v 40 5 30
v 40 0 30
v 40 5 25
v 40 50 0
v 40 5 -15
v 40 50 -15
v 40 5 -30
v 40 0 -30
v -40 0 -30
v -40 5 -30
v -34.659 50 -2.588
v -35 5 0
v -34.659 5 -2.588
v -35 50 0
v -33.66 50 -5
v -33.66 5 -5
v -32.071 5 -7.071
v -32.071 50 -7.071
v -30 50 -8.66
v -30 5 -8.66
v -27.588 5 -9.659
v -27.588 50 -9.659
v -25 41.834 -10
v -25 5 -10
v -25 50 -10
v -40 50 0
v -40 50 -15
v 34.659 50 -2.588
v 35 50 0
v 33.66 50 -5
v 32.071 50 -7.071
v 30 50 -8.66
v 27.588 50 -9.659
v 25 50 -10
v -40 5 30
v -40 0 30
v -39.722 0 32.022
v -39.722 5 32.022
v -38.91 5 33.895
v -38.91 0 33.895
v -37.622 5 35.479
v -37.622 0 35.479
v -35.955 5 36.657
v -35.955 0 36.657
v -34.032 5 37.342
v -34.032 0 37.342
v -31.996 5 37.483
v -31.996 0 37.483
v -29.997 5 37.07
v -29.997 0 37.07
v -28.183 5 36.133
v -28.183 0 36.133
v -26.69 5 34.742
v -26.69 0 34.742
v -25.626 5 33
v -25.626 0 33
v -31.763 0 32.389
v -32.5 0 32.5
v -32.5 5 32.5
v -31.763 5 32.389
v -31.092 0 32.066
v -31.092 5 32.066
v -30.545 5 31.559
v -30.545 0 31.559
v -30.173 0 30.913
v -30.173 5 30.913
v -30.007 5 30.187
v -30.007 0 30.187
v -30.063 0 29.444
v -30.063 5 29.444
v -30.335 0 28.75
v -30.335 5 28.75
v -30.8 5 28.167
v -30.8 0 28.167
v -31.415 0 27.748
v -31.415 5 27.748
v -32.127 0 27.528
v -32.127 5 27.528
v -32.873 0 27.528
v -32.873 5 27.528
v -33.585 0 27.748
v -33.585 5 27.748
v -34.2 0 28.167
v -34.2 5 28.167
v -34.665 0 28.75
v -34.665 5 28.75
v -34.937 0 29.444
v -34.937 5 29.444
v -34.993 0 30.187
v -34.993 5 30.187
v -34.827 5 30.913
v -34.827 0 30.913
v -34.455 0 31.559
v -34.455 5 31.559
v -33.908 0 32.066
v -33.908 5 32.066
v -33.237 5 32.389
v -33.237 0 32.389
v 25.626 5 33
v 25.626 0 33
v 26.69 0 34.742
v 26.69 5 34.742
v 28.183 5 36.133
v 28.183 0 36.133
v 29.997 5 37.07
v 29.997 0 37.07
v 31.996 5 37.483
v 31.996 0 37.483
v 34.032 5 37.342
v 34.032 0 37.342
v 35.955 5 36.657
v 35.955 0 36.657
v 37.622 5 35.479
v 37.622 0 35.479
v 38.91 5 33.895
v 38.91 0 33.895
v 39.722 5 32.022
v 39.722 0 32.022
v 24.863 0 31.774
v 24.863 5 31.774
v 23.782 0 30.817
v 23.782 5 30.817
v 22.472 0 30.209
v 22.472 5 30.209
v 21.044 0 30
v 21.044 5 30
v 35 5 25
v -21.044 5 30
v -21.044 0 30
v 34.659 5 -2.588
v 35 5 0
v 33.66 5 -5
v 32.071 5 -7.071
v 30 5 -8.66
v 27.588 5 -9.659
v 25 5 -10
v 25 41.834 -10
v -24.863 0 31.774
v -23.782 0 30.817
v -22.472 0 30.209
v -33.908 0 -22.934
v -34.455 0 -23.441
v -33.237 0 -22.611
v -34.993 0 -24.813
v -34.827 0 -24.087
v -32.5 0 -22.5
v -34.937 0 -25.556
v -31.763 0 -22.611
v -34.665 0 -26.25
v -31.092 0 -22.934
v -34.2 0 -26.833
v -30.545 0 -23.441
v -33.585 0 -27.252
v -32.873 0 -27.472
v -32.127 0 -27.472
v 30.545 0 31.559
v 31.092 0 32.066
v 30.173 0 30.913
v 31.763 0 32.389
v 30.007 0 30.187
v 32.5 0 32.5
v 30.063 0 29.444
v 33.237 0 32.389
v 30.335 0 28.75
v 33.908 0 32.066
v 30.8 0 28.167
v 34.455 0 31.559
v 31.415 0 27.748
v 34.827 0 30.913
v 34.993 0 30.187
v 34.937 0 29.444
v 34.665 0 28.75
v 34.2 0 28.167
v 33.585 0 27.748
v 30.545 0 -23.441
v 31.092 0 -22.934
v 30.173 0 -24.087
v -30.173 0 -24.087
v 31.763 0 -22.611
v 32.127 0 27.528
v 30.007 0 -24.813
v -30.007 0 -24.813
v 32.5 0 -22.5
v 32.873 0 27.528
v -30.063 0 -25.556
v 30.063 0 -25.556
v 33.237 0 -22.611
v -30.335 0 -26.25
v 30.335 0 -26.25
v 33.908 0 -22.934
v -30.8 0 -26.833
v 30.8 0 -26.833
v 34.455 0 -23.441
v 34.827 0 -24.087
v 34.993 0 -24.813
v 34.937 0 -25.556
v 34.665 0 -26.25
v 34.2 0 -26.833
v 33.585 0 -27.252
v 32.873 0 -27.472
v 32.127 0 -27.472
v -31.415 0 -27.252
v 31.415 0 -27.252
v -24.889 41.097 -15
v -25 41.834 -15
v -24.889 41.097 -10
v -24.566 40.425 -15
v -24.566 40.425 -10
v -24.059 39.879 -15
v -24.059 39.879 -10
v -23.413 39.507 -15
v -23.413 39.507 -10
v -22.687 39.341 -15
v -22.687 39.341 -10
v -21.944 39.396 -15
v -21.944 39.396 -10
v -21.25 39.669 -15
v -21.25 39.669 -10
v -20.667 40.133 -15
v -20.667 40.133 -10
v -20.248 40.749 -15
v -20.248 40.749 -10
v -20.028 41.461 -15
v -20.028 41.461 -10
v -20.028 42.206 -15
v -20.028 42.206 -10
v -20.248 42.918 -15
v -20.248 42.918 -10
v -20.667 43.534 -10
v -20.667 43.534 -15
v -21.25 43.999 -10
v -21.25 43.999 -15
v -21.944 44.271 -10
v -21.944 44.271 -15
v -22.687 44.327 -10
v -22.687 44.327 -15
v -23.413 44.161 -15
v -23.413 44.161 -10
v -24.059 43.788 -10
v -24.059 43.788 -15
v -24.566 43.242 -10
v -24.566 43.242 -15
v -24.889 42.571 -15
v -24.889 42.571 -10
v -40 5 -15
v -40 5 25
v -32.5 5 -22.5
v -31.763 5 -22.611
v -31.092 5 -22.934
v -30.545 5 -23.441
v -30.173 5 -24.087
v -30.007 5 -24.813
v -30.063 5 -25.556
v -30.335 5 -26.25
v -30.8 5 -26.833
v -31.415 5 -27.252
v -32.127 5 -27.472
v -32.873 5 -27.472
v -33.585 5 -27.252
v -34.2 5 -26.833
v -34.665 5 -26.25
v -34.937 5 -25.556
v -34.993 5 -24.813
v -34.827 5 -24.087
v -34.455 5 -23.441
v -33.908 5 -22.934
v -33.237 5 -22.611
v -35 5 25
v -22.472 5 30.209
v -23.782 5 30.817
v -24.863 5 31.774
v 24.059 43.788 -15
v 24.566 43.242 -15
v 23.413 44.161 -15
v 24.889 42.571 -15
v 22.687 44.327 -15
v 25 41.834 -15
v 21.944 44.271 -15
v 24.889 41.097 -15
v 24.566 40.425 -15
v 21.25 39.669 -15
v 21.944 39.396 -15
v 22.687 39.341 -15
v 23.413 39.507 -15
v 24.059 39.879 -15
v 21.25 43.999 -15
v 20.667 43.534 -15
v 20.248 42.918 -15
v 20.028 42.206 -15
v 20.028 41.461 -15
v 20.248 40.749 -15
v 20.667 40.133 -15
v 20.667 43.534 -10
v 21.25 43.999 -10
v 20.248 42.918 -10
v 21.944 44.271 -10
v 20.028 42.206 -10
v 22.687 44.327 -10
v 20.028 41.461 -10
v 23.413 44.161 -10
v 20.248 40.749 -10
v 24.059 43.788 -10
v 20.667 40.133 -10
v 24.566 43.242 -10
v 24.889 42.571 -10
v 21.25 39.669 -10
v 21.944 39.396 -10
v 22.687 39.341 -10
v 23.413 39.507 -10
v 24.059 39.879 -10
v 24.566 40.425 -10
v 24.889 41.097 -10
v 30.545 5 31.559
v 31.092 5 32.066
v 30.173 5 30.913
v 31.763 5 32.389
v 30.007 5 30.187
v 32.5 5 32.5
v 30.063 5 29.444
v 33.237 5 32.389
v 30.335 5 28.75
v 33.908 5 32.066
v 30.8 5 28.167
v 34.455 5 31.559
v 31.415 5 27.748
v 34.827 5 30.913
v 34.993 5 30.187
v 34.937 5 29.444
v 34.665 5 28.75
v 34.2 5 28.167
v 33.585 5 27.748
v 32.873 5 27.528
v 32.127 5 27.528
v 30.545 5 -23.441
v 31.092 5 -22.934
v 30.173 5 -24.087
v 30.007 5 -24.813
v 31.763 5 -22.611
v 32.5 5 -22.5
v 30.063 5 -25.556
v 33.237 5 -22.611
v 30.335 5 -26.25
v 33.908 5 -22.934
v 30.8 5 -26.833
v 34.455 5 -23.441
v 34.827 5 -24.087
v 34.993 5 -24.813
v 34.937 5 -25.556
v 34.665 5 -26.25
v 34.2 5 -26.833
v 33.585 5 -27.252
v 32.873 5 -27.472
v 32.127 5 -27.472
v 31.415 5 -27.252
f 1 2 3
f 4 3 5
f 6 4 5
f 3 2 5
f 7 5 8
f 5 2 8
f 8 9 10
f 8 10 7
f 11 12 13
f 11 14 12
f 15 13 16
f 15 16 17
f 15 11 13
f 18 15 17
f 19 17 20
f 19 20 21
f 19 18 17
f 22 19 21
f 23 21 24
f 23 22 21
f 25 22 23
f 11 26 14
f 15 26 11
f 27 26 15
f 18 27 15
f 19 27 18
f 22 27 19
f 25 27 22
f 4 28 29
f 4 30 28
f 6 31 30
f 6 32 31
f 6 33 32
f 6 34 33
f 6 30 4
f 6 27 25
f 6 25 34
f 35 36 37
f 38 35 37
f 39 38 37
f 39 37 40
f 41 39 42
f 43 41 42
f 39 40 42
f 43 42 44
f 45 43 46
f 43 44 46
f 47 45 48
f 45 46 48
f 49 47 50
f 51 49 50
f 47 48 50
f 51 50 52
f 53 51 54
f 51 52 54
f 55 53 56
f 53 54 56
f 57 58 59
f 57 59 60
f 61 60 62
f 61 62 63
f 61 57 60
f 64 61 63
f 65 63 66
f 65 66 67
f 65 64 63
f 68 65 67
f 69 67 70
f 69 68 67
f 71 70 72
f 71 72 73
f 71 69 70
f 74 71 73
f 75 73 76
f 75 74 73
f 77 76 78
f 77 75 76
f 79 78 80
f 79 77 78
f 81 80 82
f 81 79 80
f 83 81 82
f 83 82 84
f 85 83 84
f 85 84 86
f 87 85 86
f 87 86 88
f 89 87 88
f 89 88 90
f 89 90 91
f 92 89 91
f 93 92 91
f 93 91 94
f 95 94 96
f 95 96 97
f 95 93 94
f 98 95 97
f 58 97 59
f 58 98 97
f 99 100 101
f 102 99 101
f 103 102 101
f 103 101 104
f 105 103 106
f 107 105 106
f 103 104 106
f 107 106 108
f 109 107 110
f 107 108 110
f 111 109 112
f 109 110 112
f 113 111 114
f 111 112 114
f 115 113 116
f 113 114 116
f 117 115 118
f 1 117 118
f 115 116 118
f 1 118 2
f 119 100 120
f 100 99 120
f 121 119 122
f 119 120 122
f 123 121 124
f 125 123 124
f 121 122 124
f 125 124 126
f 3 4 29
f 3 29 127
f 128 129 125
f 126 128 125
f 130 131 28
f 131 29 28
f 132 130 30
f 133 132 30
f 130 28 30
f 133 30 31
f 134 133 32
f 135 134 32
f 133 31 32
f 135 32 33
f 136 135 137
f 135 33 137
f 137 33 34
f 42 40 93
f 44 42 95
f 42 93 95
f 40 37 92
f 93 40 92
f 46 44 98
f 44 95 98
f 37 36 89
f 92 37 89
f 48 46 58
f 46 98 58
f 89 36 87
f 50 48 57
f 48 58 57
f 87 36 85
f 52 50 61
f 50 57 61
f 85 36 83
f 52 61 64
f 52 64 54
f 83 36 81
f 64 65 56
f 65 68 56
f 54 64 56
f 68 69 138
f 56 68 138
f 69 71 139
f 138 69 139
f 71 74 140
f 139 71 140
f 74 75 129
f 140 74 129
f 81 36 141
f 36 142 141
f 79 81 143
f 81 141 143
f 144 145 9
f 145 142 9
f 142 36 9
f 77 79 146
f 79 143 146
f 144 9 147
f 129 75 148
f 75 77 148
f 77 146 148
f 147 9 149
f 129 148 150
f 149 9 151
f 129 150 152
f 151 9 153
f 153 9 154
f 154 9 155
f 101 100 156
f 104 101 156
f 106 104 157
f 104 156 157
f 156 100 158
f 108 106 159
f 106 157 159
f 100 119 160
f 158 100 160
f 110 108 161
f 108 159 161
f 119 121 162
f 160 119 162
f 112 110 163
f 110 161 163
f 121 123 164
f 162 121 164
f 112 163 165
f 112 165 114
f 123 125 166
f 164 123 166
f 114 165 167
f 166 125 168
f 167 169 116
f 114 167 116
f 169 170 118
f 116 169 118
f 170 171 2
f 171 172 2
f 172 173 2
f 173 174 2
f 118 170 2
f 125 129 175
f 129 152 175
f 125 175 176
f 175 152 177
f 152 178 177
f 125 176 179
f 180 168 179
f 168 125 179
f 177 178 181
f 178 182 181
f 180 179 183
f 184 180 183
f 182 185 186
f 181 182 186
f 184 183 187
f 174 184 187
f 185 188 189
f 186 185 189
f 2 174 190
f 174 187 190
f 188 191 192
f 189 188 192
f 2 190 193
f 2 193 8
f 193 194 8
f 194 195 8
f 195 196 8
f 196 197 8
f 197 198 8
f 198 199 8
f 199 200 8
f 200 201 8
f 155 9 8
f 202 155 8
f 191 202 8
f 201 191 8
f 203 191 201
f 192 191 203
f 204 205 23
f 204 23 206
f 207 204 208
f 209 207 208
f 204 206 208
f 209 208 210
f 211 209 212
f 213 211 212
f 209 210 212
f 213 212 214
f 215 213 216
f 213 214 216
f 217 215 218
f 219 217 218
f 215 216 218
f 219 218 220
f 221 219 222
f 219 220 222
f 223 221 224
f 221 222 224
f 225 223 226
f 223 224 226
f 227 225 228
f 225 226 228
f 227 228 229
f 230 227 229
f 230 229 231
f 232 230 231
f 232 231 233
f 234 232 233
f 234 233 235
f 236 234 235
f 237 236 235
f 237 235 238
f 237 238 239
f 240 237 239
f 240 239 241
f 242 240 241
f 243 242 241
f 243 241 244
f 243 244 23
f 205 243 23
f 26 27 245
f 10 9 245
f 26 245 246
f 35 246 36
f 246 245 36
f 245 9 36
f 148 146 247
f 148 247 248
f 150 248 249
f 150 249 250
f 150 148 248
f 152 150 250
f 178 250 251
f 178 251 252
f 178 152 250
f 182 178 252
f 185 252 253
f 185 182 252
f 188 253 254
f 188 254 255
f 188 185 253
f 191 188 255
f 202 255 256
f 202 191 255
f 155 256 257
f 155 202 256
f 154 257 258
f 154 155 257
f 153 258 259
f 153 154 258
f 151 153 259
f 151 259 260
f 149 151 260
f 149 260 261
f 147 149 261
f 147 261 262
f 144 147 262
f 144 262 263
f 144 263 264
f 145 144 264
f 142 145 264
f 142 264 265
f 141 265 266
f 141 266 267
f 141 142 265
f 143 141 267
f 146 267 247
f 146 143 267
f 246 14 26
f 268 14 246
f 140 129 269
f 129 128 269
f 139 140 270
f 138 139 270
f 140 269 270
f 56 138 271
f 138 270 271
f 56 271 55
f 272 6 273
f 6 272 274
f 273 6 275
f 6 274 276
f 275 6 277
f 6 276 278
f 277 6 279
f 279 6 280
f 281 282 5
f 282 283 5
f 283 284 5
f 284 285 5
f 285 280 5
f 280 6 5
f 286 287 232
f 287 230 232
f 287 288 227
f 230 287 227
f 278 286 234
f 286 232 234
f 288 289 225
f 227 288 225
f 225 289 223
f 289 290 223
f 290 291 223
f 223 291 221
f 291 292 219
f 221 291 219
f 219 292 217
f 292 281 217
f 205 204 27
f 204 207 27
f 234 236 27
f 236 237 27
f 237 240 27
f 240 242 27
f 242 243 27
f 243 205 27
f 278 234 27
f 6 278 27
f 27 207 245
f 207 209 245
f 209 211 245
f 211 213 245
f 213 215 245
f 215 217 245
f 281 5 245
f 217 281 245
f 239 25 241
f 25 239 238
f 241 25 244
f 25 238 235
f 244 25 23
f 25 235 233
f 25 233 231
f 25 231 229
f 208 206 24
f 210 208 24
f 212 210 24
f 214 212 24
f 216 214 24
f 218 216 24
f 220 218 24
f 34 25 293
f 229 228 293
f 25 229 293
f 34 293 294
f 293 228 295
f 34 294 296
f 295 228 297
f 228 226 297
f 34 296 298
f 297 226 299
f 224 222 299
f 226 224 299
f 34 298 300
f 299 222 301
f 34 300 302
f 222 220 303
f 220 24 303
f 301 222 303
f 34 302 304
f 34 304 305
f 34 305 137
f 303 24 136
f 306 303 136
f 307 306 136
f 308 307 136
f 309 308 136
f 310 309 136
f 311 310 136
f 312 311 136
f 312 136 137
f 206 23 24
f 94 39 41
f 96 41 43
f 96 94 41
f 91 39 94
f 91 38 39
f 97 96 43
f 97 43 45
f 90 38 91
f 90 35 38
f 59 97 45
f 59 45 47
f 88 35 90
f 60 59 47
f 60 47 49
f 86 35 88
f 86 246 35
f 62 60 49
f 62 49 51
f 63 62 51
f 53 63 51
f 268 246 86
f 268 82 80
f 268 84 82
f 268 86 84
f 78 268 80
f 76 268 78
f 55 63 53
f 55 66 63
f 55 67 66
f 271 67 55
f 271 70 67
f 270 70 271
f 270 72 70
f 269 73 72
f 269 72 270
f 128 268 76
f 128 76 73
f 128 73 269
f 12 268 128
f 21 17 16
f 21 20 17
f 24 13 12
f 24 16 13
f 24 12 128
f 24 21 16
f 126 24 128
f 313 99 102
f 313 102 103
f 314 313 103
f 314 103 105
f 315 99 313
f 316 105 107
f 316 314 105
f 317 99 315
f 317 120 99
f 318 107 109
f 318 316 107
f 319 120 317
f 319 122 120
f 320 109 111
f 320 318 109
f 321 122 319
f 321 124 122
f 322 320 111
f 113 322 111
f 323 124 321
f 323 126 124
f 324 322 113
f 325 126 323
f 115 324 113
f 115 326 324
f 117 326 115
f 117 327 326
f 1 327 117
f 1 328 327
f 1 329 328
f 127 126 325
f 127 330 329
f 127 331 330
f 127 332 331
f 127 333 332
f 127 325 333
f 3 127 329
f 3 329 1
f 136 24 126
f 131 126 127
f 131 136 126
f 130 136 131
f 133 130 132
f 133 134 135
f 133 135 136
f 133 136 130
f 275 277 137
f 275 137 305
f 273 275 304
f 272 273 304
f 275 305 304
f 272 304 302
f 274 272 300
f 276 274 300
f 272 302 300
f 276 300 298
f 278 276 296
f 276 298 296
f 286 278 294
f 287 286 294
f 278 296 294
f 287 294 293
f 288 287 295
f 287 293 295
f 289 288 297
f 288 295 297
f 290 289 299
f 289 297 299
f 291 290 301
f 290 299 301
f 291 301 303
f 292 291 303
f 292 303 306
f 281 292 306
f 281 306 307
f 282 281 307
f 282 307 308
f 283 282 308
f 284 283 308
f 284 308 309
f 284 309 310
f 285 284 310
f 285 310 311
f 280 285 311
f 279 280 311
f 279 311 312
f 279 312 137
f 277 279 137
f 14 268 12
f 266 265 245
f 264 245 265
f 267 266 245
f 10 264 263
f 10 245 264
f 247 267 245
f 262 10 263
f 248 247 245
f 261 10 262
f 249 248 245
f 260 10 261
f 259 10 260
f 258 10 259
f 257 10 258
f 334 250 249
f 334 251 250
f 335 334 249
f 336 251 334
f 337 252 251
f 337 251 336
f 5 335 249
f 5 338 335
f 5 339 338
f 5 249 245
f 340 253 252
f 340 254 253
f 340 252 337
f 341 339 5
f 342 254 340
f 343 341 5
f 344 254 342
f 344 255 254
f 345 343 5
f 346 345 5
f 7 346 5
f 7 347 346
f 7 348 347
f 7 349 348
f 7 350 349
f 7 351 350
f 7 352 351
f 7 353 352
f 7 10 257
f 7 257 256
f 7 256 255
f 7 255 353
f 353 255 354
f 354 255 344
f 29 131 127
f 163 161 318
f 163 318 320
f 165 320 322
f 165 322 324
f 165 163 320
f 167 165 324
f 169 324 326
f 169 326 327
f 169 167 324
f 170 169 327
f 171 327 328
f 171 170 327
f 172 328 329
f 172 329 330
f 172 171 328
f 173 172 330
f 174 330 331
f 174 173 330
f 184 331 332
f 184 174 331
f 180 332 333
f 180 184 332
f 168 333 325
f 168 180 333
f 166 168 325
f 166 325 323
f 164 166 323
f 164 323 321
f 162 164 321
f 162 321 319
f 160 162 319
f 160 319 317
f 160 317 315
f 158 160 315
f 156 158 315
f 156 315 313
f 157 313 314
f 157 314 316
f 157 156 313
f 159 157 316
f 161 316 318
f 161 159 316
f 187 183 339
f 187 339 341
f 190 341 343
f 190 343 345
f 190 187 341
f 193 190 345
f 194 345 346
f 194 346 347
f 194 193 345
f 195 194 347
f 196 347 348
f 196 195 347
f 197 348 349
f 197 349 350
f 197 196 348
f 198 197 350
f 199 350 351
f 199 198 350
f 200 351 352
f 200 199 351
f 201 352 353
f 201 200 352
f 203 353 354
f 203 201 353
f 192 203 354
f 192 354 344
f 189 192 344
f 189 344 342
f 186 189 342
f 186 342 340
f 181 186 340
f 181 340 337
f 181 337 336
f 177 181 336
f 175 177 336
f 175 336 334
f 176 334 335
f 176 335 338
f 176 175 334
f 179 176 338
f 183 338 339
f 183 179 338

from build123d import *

# Parameters (mm, degrees)
SKETCH1_R             = 2.5
BOSS_EXTRUDE1_DEPTH   = 5
SKETCH1_W             = 80
SKETCH1_H             = 15
BOSS_EXTRUDE1_2_DEPTH = 5
BOSS_EXTRUDE2_DEPTH   = 50
CUT_EXTRUDE1_DEPTH    = 40
FILLET1_R             = 10
SKETCH3_R             = 2.5
CUT_EXTRUDE2_DEPTH    = 20
FILLET2_R             = 5


with BuildPart() as part:
    # Sketch1 → Boss-Extrude1 (new body)
    with BuildSketch(Plane(origin=(0, 0, 0), x_dir=(1, 0, 0), z_dir=(0, 1, 0))):
        with BuildLine():
            ThreePointArc((-40, -30), (-32.5, -37.5), (-25, -30))
            Line((-25, -30), (25, -30))
            ThreePointArc((25, -30), (32.5, -37.5), (40, -30))
            Line((40, -30), (40, -25))
            Line((40, -25), (35, -25))
            Line((35, -25), (35, 10))
            Line((35, 10), (-35, 10))
            Line((-35, 10), (-35, -25))
            Line((-35, -25), (-40, -25))
            Line((-40, -25), (-40, -30))
        make_face()
        with Locations((-32.5, -30)):
            Circle(SKETCH1_R, mode=Mode.SUBTRACT)
        with Locations((32.5, -30)):
            Circle(SKETCH1_R, mode=Mode.SUBTRACT)
    extrude(amount=BOSS_EXTRUDE1_DEPTH)



with BuildPart() as body_2:
    # Sketch1 → Boss-Extrude1 2 (new body)
    with BuildSketch(Plane(origin=(0, 0, 0), x_dir=(1, 0, 0), z_dir=(0, 1, 0))):
        with Locations((0, 22.5)):
            Rectangle(SKETCH1_W, SKETCH1_H)
        with Locations((-32.5, 25)):
            Circle(SKETCH1_R, mode=Mode.SUBTRACT)
        with Locations((32.5, 25)):
            Circle(SKETCH1_R, mode=Mode.SUBTRACT)
    extrude(amount=BOSS_EXTRUDE1_2_DEPTH)


with BuildPart() as part_1:
    add(part.part)

    add(body_2.part)  # Boss-Extrude2 merges body 2
    # Sketch1<3> → Boss-Extrude2 (add)
    with BuildSketch(Plane(origin=(0, 0, 0), x_dir=(1, 0, 0), z_dir=(0, 1, 0))):
        Polygon((-40, -25), (-35, -25), (-35, 10), (35, 10), (35, -25), (40, -25), (40, 15), (-40, 15), align=None)
    extrude(amount=BOSS_EXTRUDE2_DEPTH)

    # Sketch2 → Cut-Extrude1 (cut, symmetric)
    with BuildSketch(Plane(origin=(0, 0, 0), x_dir=(0, 0, -1), z_dir=(1, 0, 0))):
        Polygon((0, 50), (-25, 5), (-25, 50), align=None)
    extrude(amount=CUT_EXTRUDE1_DEPTH, both=True, mode=Mode.SUBTRACT)

    # Fillet1
    fillet1_edges = [part_1.edges().sort_by_distance(p)[0] for p in [
        (-35, 27.5, -10),
        (35, 27.5, -10),
    ]]
    fillet(fillet1_edges, radius=FILLET1_R)

    # Sketch3 → Cut-Extrude2 (cut)
    with BuildSketch(Plane.XY):
        with Locations((-22.5, 41.833761029)):
            Circle(SKETCH3_R)
        with Locations((22.5, 41.833761029)):
            Circle(SKETCH3_R)
    extrude(amount=-CUT_EXTRUDE2_DEPTH, mode=Mode.SUBTRACT)

    # Fillet2
    fillet2_edges = [part_1.edges().sort_by_distance(p)[0] for p in [
        (25, 2.5, 30),
        (-25, 2.5, 30),
    ]]
    fillet(fillet2_edges, radius=FILLET2_R)


solid = part_1.part
